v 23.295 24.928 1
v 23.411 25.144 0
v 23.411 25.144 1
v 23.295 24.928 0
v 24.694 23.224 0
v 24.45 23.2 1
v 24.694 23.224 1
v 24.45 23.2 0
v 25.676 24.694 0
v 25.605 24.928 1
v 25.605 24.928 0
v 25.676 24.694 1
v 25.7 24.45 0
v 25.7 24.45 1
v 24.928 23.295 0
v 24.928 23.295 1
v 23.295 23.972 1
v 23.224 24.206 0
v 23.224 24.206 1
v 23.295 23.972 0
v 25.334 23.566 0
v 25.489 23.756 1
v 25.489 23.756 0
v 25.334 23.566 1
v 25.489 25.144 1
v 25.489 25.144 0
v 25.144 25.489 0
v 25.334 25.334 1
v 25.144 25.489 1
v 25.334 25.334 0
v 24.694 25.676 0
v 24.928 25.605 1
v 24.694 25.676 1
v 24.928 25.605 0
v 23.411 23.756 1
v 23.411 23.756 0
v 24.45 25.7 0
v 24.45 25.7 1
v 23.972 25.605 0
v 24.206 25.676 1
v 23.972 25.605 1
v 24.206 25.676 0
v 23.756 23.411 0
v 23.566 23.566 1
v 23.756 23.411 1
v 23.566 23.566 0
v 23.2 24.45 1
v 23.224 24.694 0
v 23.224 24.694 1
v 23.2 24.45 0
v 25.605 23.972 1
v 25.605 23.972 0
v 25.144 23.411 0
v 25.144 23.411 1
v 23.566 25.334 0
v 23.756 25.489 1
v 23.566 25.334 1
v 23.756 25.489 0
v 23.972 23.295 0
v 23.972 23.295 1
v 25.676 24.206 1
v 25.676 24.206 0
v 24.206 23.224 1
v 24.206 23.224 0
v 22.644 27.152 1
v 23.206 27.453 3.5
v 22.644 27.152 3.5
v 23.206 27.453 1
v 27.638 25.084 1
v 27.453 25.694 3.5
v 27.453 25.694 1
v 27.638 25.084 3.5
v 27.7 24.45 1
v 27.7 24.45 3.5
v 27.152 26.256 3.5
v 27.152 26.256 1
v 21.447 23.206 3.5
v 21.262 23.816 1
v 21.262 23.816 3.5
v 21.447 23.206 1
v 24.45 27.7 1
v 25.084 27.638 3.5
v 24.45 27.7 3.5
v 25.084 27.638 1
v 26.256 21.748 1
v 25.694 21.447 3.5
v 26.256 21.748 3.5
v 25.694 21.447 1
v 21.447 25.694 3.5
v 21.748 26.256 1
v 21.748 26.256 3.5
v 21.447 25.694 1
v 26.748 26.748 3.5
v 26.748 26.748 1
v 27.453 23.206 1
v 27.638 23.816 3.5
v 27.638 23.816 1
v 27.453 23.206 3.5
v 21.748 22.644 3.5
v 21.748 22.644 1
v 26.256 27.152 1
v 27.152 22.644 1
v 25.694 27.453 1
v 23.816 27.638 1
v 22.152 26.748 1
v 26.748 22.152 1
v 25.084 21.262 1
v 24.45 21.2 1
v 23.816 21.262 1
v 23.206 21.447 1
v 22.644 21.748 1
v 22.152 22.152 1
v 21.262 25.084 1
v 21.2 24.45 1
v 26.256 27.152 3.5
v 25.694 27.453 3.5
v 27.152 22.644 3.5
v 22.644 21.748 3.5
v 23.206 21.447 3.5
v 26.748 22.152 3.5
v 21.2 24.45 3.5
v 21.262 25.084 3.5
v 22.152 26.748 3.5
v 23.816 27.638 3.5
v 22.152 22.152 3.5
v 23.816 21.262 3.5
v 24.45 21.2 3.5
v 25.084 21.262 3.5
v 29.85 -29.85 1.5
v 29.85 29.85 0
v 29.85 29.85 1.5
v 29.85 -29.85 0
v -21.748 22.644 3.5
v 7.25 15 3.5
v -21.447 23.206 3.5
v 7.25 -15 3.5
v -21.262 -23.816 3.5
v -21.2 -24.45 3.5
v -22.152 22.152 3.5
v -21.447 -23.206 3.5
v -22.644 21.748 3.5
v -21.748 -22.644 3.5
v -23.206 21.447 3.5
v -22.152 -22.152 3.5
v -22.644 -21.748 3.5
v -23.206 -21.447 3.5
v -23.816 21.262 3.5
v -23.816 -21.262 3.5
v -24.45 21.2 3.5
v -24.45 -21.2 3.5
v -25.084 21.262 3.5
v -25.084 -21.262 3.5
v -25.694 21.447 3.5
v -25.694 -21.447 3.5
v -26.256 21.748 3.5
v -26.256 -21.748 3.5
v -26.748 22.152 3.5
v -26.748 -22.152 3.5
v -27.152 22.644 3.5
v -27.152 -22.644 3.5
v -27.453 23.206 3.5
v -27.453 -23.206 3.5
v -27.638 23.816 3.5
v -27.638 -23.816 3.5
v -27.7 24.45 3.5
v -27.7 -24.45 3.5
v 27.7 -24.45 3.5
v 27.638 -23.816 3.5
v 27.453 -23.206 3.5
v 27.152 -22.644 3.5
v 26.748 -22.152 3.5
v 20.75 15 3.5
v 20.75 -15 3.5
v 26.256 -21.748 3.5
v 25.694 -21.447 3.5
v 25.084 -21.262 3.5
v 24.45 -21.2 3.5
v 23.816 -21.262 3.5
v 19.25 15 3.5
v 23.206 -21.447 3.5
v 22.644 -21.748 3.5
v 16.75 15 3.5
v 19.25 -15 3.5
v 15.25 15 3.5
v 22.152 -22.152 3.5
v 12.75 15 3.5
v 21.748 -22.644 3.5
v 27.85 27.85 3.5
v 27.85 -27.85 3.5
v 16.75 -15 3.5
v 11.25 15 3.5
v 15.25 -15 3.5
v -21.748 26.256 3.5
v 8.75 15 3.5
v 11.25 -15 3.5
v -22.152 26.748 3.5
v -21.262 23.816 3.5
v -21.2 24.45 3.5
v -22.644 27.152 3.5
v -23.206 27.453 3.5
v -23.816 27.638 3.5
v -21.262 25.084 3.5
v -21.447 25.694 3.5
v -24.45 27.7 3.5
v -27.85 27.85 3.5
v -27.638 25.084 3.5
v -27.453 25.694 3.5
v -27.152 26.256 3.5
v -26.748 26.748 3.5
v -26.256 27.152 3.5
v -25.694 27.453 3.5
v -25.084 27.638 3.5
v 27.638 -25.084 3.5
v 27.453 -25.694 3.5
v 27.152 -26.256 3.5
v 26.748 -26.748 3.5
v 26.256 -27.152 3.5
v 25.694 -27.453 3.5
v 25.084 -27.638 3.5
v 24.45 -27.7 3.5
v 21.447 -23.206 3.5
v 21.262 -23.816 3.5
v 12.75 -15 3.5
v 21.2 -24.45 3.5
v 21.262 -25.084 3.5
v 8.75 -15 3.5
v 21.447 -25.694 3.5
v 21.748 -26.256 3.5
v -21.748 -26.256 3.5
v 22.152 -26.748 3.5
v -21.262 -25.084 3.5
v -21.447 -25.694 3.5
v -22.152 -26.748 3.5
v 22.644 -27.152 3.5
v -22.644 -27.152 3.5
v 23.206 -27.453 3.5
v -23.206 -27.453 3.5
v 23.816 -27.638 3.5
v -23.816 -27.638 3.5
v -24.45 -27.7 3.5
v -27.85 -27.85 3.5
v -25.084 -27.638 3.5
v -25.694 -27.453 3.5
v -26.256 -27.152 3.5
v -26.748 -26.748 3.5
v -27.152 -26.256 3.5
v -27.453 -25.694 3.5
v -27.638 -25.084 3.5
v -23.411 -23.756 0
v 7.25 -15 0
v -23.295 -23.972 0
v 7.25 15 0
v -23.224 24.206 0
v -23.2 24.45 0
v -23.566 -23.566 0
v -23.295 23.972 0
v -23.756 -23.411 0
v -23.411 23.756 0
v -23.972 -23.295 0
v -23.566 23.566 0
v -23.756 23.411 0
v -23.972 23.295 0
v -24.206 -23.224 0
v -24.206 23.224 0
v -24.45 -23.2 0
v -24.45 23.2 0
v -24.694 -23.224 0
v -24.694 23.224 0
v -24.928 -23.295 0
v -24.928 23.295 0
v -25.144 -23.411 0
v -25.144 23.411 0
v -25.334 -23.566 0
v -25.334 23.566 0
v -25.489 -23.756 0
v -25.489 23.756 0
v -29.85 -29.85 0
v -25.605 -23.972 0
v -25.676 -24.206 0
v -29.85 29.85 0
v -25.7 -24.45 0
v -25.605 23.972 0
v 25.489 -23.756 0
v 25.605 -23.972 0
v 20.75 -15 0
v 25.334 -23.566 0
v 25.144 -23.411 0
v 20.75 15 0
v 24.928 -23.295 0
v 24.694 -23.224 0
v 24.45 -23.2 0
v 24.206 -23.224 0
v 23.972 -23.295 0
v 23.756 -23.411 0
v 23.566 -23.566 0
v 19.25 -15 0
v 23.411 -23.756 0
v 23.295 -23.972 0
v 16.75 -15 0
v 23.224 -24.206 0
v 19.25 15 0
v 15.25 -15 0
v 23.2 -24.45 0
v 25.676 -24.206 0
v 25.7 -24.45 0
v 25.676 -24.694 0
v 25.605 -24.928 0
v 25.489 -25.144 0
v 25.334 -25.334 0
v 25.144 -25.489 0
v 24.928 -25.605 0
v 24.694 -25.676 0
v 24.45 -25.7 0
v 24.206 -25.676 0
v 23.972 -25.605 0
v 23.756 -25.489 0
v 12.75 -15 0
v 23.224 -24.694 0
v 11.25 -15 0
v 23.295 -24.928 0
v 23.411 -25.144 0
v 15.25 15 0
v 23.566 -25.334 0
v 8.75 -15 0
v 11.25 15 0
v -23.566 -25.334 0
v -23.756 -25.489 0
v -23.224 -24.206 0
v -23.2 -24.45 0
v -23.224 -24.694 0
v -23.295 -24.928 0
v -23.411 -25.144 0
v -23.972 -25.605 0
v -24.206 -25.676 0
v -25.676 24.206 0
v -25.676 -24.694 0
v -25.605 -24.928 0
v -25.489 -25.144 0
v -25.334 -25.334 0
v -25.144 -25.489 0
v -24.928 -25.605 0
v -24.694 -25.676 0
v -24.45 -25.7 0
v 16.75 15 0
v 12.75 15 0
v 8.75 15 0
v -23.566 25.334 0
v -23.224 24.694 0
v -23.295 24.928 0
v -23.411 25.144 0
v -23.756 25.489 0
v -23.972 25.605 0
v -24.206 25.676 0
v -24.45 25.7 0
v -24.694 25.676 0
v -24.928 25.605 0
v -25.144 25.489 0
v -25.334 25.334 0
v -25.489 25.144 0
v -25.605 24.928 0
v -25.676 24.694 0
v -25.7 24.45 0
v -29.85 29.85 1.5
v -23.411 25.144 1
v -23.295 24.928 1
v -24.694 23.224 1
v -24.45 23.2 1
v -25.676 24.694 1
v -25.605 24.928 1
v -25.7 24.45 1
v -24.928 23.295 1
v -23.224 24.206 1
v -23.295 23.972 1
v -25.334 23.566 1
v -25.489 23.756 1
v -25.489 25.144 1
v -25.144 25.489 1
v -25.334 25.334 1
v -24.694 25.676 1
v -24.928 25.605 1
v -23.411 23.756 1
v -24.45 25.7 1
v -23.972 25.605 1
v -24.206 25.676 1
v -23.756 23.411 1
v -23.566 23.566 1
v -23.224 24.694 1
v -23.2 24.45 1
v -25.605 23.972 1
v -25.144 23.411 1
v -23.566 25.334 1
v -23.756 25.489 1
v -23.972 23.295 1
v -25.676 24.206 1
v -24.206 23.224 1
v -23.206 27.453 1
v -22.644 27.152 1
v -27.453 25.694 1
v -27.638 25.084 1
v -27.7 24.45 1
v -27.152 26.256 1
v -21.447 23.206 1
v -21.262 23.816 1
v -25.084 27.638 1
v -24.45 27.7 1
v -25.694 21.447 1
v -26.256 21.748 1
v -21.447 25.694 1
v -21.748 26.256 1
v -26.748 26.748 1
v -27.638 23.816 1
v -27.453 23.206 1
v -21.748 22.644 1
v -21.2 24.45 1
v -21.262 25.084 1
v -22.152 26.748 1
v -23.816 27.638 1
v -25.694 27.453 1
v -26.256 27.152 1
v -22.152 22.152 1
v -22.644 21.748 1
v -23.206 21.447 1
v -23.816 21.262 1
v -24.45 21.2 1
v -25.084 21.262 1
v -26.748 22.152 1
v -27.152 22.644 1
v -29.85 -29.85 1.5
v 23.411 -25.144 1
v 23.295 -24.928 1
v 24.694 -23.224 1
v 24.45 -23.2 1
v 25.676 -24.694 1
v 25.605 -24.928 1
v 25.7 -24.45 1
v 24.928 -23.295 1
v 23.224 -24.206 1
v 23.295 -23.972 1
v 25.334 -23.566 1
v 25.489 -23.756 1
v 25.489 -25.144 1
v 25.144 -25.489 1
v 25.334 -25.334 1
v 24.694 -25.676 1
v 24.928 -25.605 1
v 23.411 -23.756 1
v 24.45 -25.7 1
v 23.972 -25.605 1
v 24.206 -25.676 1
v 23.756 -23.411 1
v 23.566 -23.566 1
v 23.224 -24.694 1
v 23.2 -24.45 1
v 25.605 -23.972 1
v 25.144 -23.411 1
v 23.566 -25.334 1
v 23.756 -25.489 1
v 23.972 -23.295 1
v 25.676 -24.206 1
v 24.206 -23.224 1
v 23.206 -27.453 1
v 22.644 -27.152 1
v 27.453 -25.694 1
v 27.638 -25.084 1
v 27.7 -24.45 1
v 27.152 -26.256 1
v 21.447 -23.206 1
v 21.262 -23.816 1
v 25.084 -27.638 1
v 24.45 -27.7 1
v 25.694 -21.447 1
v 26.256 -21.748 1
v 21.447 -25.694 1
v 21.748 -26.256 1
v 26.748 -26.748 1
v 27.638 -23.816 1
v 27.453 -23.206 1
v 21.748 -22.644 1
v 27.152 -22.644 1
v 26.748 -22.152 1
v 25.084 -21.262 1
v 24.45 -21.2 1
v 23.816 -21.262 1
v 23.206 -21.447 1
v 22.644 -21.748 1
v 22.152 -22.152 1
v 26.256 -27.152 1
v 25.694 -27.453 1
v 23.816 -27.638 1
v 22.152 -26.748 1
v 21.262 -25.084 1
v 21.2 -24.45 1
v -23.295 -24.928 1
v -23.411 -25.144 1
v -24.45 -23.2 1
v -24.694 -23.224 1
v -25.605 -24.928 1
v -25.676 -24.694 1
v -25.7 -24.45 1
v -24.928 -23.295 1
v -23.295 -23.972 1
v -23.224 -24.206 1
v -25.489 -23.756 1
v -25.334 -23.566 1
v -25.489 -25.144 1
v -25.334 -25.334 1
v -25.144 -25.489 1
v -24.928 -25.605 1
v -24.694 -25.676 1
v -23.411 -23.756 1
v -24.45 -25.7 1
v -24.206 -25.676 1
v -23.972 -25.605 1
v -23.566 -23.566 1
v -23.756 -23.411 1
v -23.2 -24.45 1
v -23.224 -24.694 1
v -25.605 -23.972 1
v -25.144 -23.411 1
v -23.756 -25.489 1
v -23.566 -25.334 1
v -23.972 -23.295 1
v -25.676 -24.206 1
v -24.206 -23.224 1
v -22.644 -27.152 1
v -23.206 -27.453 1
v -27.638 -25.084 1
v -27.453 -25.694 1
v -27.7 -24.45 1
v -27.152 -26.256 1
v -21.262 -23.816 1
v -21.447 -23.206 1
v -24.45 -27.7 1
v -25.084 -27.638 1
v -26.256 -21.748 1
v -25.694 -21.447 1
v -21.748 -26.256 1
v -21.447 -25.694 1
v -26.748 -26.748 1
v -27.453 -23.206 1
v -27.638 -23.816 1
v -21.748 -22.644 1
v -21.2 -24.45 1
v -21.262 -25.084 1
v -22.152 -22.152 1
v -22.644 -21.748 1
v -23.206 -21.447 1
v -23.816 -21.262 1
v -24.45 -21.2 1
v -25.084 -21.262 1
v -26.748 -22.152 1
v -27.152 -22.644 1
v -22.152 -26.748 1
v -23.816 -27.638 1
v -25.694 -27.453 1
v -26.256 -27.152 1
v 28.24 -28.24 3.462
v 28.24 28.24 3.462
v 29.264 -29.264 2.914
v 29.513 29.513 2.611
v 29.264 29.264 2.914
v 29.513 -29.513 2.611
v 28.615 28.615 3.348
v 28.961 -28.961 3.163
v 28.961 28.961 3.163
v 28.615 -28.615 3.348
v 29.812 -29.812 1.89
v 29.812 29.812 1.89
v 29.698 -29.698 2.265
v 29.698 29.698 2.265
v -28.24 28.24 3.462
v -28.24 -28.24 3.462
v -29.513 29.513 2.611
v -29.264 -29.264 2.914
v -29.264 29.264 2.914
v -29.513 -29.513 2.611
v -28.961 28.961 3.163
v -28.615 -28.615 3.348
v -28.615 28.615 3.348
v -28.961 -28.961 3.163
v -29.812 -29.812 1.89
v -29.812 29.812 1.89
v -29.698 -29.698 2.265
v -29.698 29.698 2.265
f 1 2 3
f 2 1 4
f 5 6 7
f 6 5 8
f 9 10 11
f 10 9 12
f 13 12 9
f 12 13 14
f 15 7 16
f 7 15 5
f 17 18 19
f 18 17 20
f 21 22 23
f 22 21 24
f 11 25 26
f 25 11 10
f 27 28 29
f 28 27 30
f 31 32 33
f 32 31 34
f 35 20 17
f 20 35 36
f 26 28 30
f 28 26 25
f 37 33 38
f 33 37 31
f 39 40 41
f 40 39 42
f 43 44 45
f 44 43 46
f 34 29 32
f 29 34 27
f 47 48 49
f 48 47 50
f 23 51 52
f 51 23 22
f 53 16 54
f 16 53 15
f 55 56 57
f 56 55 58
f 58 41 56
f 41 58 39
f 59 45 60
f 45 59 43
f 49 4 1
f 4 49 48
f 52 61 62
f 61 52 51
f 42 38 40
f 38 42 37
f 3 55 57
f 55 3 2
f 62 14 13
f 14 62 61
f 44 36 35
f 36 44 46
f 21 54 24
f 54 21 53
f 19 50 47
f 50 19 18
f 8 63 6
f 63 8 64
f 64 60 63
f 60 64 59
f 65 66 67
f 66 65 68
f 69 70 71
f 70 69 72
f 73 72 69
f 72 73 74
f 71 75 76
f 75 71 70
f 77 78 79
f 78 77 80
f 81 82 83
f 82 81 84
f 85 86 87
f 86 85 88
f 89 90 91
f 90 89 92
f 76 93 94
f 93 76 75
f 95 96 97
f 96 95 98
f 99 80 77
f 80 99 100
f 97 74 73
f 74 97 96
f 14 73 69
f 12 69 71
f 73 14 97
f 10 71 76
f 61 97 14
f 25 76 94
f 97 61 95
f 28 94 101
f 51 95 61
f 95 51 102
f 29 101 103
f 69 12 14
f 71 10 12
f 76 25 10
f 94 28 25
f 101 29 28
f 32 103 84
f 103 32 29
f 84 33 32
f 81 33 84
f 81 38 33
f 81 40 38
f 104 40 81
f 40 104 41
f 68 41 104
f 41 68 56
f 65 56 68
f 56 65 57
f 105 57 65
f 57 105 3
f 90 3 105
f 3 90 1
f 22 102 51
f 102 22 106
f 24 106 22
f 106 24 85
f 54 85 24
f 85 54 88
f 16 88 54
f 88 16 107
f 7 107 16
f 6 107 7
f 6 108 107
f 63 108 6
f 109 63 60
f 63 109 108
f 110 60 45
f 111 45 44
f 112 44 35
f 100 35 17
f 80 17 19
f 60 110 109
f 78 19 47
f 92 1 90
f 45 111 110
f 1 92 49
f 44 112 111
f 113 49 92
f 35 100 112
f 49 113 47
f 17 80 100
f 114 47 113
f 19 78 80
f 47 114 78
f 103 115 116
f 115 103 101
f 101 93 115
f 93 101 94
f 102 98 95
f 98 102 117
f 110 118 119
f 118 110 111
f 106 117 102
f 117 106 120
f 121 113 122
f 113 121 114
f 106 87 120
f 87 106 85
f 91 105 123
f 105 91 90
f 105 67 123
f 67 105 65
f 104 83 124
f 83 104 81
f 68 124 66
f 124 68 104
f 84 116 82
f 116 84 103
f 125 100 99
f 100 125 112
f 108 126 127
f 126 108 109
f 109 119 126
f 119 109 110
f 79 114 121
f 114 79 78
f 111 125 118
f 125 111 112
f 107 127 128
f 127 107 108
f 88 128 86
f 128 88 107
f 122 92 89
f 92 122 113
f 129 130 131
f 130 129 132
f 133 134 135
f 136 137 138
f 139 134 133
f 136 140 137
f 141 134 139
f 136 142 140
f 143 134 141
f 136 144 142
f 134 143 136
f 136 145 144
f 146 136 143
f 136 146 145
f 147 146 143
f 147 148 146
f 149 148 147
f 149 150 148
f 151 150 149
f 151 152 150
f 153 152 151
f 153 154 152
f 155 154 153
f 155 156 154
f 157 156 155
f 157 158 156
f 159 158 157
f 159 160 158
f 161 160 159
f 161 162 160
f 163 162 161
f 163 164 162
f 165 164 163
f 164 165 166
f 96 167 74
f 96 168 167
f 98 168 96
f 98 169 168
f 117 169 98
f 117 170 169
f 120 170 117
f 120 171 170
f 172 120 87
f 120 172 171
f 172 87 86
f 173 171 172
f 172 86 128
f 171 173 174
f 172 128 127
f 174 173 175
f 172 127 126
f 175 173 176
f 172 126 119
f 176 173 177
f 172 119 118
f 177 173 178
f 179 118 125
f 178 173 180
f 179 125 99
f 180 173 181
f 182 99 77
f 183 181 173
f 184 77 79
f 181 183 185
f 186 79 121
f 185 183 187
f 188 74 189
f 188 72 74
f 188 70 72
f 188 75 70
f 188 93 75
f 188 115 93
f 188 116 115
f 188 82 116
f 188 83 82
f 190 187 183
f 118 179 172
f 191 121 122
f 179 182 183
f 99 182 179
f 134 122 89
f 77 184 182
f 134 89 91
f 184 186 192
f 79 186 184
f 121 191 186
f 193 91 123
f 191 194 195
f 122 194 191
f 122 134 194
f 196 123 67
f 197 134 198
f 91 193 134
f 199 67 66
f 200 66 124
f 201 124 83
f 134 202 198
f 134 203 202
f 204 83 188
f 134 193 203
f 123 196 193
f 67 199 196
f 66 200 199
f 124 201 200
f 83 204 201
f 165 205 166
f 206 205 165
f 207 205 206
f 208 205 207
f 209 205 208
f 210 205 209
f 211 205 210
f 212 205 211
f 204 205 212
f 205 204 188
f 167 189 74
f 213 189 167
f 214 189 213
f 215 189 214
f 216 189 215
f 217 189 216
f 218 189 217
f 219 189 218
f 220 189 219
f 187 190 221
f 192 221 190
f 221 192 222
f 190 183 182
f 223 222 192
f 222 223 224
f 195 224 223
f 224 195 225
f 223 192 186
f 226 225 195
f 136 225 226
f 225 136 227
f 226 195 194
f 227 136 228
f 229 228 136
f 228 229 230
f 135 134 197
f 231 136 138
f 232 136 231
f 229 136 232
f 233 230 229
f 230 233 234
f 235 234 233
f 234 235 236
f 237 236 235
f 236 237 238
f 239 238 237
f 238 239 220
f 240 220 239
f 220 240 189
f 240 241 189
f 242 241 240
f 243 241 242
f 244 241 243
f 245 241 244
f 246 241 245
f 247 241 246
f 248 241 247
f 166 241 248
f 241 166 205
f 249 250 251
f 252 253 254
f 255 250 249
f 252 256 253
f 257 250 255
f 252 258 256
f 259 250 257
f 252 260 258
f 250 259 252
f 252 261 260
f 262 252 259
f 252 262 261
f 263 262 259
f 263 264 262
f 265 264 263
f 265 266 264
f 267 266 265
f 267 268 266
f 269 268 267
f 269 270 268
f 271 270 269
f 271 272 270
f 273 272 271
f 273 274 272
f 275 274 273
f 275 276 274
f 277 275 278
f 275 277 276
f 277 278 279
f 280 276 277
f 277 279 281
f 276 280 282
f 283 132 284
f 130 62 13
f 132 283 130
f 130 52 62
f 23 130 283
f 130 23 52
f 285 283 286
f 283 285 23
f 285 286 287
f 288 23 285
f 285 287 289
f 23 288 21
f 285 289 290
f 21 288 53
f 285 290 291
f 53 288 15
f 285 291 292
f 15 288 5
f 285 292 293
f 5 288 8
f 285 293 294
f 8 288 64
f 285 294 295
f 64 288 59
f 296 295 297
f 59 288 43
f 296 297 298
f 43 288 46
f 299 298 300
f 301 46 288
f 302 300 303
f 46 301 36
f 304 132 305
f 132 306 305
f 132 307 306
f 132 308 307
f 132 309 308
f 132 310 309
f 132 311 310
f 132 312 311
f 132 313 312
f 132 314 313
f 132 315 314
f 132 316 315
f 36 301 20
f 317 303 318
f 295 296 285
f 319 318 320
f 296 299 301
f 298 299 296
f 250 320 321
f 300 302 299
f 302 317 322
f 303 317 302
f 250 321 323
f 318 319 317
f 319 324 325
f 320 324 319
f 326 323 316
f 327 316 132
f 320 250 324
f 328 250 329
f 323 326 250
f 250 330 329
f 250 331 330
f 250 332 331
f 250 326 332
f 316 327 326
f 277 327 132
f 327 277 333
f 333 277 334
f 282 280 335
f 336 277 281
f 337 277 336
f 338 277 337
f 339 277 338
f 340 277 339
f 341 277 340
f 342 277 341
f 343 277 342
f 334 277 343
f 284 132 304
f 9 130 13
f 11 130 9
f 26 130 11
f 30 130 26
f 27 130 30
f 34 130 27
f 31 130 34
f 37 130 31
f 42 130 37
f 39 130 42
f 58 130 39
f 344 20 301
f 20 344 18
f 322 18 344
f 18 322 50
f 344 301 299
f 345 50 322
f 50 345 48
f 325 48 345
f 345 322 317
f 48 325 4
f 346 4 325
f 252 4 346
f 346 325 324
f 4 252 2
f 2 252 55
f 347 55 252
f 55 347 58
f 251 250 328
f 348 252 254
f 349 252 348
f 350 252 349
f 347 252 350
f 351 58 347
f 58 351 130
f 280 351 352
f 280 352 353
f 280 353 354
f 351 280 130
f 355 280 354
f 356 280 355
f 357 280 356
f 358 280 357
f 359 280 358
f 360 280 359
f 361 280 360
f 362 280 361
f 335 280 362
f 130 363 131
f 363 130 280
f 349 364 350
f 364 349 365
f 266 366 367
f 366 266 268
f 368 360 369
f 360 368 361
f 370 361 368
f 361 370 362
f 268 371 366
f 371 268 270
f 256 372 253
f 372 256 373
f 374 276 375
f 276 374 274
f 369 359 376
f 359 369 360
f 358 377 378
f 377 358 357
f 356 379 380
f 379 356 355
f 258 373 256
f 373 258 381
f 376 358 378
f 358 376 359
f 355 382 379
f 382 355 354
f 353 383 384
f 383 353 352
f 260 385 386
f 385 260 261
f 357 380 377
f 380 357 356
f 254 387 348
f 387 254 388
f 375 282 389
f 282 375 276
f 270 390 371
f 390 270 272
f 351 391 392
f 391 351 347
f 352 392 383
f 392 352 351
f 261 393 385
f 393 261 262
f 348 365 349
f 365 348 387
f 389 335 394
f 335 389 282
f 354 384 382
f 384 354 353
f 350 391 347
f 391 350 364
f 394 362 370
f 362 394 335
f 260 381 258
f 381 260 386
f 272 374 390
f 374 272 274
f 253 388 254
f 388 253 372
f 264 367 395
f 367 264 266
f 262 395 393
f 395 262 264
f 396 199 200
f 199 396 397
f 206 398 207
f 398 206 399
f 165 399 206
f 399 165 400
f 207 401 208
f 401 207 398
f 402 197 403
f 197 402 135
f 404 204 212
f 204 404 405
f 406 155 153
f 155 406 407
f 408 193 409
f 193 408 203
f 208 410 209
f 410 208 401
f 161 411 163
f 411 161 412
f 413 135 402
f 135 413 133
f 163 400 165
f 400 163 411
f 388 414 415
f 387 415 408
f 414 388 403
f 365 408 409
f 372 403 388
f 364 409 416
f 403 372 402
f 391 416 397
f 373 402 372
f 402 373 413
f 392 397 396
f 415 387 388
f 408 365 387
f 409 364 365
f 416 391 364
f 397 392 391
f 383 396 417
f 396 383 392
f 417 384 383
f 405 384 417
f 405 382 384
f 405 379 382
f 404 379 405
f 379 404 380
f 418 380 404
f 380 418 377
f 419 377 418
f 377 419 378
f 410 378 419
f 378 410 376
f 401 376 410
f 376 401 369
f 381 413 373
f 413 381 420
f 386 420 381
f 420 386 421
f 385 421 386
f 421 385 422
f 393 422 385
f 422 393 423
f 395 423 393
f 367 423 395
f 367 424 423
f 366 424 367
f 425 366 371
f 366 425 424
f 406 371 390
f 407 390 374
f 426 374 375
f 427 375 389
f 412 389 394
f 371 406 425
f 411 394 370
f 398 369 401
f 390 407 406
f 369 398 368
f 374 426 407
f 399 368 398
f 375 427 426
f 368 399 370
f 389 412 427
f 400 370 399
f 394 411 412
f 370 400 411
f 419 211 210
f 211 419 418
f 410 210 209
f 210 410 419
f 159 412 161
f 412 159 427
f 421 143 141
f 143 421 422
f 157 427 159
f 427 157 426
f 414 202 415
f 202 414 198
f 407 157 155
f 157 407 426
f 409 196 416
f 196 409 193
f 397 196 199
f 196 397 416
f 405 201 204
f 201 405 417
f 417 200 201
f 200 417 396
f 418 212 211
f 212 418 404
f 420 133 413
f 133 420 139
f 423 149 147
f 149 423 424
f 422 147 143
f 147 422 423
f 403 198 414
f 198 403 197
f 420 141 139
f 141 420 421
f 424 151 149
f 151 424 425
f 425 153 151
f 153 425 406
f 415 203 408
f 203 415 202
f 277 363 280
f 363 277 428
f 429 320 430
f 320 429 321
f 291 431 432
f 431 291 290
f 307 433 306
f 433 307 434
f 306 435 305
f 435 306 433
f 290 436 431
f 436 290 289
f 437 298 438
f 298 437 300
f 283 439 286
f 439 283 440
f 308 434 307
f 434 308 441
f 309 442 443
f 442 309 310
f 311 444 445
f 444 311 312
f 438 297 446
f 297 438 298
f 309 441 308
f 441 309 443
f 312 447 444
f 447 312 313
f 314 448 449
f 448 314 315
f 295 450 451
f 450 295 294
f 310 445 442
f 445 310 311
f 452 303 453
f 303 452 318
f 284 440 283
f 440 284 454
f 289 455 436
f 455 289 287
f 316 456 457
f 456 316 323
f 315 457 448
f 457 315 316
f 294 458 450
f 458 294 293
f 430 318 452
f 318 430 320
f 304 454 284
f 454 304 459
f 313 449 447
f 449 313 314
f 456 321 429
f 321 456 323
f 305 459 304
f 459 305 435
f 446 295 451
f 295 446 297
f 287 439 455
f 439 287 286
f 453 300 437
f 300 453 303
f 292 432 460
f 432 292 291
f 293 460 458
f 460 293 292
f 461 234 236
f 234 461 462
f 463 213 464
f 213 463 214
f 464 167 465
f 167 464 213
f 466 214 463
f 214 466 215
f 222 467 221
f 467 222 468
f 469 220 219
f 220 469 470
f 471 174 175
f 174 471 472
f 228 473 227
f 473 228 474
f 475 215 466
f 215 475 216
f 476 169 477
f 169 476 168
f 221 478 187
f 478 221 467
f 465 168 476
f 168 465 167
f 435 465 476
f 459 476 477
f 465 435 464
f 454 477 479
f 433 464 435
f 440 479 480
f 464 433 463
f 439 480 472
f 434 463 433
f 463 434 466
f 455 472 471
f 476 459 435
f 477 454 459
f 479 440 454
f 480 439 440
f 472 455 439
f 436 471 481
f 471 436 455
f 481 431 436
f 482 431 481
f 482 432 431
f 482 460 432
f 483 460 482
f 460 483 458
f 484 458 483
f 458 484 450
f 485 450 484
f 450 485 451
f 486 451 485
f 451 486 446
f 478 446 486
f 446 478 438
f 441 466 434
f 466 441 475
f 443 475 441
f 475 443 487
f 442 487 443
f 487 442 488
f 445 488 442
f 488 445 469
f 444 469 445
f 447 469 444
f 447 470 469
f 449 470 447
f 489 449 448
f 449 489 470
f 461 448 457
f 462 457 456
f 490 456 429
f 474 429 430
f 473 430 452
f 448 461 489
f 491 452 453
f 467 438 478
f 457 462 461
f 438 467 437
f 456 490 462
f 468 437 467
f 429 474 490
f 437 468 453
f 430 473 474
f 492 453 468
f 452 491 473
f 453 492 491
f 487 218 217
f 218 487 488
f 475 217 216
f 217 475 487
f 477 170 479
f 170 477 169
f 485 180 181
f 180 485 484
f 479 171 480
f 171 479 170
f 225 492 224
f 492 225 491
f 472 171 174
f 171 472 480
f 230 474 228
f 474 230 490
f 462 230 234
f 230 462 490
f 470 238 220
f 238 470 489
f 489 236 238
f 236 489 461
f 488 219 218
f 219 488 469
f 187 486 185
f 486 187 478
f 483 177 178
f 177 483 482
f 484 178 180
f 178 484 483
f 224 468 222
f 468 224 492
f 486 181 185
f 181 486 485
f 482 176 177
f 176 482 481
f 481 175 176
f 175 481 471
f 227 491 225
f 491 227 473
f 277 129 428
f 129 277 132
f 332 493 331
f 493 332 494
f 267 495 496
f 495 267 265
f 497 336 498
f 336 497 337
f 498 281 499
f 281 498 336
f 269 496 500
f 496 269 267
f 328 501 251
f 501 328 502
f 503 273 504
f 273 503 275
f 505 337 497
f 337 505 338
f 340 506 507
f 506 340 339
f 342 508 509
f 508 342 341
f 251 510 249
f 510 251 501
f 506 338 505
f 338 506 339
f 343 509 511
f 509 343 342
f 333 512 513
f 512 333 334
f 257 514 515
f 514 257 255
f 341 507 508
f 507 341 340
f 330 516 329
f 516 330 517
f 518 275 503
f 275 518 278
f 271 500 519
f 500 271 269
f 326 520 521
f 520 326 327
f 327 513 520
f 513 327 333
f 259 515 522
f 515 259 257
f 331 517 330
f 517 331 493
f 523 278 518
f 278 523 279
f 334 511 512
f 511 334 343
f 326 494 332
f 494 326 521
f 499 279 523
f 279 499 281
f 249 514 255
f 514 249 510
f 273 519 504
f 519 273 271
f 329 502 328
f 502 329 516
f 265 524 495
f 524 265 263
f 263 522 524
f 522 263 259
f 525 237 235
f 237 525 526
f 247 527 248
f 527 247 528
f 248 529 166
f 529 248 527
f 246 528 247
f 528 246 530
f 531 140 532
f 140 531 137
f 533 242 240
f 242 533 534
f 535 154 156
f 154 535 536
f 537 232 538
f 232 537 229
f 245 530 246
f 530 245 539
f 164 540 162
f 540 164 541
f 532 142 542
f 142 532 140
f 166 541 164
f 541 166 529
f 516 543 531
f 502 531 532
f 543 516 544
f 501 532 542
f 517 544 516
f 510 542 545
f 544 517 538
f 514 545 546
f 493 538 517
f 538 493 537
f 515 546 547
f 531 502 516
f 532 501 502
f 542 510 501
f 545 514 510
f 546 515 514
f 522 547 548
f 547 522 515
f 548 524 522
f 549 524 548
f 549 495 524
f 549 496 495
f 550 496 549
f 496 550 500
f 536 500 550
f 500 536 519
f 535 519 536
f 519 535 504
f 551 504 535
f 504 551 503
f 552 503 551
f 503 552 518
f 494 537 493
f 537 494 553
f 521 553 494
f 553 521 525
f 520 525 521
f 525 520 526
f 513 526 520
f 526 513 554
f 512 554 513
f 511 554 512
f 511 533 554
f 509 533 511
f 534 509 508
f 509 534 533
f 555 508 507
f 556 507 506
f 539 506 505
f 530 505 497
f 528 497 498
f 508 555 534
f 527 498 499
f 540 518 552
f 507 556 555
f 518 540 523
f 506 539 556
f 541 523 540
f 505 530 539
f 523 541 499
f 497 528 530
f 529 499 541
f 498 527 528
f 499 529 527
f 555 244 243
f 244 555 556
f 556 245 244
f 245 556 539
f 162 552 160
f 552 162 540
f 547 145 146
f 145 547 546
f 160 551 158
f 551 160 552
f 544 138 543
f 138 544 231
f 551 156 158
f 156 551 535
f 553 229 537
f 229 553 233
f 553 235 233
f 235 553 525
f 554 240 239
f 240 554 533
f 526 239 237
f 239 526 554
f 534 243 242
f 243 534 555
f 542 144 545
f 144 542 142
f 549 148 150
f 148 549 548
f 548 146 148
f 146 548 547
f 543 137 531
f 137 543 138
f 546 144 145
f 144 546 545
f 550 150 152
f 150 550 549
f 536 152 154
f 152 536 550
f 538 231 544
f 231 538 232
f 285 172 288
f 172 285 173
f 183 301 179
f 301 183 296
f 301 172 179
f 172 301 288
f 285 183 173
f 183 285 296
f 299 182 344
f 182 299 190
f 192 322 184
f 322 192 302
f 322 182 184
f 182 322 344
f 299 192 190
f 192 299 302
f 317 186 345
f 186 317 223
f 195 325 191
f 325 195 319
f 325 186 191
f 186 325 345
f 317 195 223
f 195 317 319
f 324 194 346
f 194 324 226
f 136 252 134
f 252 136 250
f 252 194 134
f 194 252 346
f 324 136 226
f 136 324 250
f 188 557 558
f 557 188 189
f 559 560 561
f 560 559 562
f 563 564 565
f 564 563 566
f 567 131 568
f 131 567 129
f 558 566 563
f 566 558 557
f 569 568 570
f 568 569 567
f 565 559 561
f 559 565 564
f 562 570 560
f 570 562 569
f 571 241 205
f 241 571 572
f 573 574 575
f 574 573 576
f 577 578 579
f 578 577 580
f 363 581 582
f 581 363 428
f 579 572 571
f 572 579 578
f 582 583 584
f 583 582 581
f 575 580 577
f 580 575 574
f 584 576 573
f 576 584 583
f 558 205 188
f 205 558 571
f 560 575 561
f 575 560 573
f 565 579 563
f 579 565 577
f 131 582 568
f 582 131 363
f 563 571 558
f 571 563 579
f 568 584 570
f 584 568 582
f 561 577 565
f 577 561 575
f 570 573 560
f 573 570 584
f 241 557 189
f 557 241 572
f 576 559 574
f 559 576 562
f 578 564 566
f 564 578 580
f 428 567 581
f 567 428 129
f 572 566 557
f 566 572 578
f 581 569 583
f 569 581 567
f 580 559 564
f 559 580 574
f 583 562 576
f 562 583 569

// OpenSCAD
// file: door-case-params.scad
/*	
	k4cg door-status
	Copyright (C) 2017  Christian Carlowitz <chca@cmesh.de>

	This program is free software: you can redistribute it and/or modify
	it under the terms of the GNU General Public License as published by
	the Free Software Foundation, either version 3 of the License, or
	(at your option) any later version.

	This program is distributed in the hope that it will be useful,
	but WITHOUT ANY WARRANTY; without even the implied warranty of
	MERCHANTABILITY or FITNESS FOR A PARTICULAR PURPOSE.  See the
	GNU General Public License for more details.

	You should have received a copy of the GNU General Public License
	along with this program.  If not, see <http://www.gnu.org/licenses/>.
*/

eps = 0.1;
$fn=32;

boardGap = 1;
boardX = 55+eps; // PCB width
boardY = 55+eps; // PCB depth
boardZ = 0; // PCB height
addZ = 23; // additional Y height until top part begins
wall = 1.4; // casing wall thickness
wallInsetW = 0;
wallInsetH = 0;
wallInsetOff = 0.2;

bottomHeight = 1.4;

mountR = 3;
mountW = 7;
mountHeight = boardZ+addZ;
mountDrill = 2.5;

screwSinkH = 2.5;
screwSinkD = 6.5;

// top plate
topHeight = 3.5;
// main file
/*	
	k4cg door-status
	Copyright (C) 2017  Christian Carlowitz <chca@cmesh.de>

	This program is free software: you can redistribute it and/or modify
	it under the terms of the GNU General Public License as published by
	the Free Software Foundation, either version 3 of the License, or
	(at your option) any later version.

	This program is distributed in the hope that it will be useful,
	but WITHOUT ANY WARRANTY; without even the implied warranty of
	MERCHANTABILITY or FITNESS FOR A PARTICULAR PURPOSE.  See the
	GNU General Public License for more details.

	You should have received a copy of the GNU General Public License
	along with this program.  If not, see <http://www.gnu.org/licenses/>.
*/

// *** all dimensions in mm ***

include <door-case-params.scad>

module shell(w,x,y,z,winw,winh,woff)
{
	union()
	{
		difference()
		{
			cube([x+w, y+w, z]); // outer volume
	
			//translate([-eps,-eps,-eps])
			//cube([x+winw+woff+eps,y+winw+woff+eps,winh*2+2*eps]); // notch
		}
		
		//cube([x-woff*3,y-woff*3,z-eps]);
	}
}

module case()
{
	difference()
	{
		union()
		{
			// outer case shell
			shell(wall, boardX/2+boardGap, boardY/2+boardGap, topHeight,
				wallInsetW, wallInsetH, wallInsetOff);
		}

		translate([boardX/2-mountR, boardY/2-mountR, -eps])
		{
			// screw drill
			cylinder(h=(topHeight+2*eps), r=mountDrill/2);
			
			// screw sink
			translate([0,0,topHeight-screwSinkH+eps])
			cylinder(h=(screwSinkH+eps), r=screwSinkD/2);
		}
	}
}

module cut(x,y,w,h)
{
	translate([x-w/2,y-h/2,-eps])
	cube([w,h,topHeight+2*eps]);
}

module body()
{

	union()
	{
		difference()
		{
			union()
			{
				translate([-eps,-eps,0])
				case();

				mirror([-1,0,0])
				translate([-eps,-eps,0])
				case();

				mirror([0,-1,0])
				translate([-eps,-eps,0])
				case();

				mirror([0,-1,0])
				mirror([-1,0,0])
				translate([-eps,-eps,0])
				case();
			}

			cut(20,0,1.5,30);
			cut(16,0,1.5,30);
			cut(12,0,1.5,30);
			cut(8,0,1.5,30);

		}
	}
}

module fillet(r,l) // along y axis
{
	translate([0,-l/2-eps,0])
	difference()
	{
		cube([r*2,l+2*eps,r*2]);
		translate([0,-eps,0])
		rotate([-90,0,0])
		cylinder(h=l+4*eps,r=r);
	}
}

filletR = 2;
caseY = boardY+2*boardGap+2*wall-2*eps; // -2*eps: remove offset for union of mirrored parts
caseX = boardX+2*boardGap+2*wall-2*eps;

difference()
{
	body();

	translate([caseX/2-filletR,0,topHeight-filletR])
	fillet(filletR,caseY);

	rotate([0,0,180])
	translate([caseX/2-filletR,0,topHeight-filletR])
	fillet(filletR,caseY);
	
	translate([0,caseY/2-filletR,topHeight-filletR])
	rotate([0,0,90])
	fillet(filletR,caseX);

	rotate([0,0,180])
	translate([0,caseY/2-filletR,topHeight-filletR])
	rotate([0,0,90])
	fillet(filletR,caseX);
}
